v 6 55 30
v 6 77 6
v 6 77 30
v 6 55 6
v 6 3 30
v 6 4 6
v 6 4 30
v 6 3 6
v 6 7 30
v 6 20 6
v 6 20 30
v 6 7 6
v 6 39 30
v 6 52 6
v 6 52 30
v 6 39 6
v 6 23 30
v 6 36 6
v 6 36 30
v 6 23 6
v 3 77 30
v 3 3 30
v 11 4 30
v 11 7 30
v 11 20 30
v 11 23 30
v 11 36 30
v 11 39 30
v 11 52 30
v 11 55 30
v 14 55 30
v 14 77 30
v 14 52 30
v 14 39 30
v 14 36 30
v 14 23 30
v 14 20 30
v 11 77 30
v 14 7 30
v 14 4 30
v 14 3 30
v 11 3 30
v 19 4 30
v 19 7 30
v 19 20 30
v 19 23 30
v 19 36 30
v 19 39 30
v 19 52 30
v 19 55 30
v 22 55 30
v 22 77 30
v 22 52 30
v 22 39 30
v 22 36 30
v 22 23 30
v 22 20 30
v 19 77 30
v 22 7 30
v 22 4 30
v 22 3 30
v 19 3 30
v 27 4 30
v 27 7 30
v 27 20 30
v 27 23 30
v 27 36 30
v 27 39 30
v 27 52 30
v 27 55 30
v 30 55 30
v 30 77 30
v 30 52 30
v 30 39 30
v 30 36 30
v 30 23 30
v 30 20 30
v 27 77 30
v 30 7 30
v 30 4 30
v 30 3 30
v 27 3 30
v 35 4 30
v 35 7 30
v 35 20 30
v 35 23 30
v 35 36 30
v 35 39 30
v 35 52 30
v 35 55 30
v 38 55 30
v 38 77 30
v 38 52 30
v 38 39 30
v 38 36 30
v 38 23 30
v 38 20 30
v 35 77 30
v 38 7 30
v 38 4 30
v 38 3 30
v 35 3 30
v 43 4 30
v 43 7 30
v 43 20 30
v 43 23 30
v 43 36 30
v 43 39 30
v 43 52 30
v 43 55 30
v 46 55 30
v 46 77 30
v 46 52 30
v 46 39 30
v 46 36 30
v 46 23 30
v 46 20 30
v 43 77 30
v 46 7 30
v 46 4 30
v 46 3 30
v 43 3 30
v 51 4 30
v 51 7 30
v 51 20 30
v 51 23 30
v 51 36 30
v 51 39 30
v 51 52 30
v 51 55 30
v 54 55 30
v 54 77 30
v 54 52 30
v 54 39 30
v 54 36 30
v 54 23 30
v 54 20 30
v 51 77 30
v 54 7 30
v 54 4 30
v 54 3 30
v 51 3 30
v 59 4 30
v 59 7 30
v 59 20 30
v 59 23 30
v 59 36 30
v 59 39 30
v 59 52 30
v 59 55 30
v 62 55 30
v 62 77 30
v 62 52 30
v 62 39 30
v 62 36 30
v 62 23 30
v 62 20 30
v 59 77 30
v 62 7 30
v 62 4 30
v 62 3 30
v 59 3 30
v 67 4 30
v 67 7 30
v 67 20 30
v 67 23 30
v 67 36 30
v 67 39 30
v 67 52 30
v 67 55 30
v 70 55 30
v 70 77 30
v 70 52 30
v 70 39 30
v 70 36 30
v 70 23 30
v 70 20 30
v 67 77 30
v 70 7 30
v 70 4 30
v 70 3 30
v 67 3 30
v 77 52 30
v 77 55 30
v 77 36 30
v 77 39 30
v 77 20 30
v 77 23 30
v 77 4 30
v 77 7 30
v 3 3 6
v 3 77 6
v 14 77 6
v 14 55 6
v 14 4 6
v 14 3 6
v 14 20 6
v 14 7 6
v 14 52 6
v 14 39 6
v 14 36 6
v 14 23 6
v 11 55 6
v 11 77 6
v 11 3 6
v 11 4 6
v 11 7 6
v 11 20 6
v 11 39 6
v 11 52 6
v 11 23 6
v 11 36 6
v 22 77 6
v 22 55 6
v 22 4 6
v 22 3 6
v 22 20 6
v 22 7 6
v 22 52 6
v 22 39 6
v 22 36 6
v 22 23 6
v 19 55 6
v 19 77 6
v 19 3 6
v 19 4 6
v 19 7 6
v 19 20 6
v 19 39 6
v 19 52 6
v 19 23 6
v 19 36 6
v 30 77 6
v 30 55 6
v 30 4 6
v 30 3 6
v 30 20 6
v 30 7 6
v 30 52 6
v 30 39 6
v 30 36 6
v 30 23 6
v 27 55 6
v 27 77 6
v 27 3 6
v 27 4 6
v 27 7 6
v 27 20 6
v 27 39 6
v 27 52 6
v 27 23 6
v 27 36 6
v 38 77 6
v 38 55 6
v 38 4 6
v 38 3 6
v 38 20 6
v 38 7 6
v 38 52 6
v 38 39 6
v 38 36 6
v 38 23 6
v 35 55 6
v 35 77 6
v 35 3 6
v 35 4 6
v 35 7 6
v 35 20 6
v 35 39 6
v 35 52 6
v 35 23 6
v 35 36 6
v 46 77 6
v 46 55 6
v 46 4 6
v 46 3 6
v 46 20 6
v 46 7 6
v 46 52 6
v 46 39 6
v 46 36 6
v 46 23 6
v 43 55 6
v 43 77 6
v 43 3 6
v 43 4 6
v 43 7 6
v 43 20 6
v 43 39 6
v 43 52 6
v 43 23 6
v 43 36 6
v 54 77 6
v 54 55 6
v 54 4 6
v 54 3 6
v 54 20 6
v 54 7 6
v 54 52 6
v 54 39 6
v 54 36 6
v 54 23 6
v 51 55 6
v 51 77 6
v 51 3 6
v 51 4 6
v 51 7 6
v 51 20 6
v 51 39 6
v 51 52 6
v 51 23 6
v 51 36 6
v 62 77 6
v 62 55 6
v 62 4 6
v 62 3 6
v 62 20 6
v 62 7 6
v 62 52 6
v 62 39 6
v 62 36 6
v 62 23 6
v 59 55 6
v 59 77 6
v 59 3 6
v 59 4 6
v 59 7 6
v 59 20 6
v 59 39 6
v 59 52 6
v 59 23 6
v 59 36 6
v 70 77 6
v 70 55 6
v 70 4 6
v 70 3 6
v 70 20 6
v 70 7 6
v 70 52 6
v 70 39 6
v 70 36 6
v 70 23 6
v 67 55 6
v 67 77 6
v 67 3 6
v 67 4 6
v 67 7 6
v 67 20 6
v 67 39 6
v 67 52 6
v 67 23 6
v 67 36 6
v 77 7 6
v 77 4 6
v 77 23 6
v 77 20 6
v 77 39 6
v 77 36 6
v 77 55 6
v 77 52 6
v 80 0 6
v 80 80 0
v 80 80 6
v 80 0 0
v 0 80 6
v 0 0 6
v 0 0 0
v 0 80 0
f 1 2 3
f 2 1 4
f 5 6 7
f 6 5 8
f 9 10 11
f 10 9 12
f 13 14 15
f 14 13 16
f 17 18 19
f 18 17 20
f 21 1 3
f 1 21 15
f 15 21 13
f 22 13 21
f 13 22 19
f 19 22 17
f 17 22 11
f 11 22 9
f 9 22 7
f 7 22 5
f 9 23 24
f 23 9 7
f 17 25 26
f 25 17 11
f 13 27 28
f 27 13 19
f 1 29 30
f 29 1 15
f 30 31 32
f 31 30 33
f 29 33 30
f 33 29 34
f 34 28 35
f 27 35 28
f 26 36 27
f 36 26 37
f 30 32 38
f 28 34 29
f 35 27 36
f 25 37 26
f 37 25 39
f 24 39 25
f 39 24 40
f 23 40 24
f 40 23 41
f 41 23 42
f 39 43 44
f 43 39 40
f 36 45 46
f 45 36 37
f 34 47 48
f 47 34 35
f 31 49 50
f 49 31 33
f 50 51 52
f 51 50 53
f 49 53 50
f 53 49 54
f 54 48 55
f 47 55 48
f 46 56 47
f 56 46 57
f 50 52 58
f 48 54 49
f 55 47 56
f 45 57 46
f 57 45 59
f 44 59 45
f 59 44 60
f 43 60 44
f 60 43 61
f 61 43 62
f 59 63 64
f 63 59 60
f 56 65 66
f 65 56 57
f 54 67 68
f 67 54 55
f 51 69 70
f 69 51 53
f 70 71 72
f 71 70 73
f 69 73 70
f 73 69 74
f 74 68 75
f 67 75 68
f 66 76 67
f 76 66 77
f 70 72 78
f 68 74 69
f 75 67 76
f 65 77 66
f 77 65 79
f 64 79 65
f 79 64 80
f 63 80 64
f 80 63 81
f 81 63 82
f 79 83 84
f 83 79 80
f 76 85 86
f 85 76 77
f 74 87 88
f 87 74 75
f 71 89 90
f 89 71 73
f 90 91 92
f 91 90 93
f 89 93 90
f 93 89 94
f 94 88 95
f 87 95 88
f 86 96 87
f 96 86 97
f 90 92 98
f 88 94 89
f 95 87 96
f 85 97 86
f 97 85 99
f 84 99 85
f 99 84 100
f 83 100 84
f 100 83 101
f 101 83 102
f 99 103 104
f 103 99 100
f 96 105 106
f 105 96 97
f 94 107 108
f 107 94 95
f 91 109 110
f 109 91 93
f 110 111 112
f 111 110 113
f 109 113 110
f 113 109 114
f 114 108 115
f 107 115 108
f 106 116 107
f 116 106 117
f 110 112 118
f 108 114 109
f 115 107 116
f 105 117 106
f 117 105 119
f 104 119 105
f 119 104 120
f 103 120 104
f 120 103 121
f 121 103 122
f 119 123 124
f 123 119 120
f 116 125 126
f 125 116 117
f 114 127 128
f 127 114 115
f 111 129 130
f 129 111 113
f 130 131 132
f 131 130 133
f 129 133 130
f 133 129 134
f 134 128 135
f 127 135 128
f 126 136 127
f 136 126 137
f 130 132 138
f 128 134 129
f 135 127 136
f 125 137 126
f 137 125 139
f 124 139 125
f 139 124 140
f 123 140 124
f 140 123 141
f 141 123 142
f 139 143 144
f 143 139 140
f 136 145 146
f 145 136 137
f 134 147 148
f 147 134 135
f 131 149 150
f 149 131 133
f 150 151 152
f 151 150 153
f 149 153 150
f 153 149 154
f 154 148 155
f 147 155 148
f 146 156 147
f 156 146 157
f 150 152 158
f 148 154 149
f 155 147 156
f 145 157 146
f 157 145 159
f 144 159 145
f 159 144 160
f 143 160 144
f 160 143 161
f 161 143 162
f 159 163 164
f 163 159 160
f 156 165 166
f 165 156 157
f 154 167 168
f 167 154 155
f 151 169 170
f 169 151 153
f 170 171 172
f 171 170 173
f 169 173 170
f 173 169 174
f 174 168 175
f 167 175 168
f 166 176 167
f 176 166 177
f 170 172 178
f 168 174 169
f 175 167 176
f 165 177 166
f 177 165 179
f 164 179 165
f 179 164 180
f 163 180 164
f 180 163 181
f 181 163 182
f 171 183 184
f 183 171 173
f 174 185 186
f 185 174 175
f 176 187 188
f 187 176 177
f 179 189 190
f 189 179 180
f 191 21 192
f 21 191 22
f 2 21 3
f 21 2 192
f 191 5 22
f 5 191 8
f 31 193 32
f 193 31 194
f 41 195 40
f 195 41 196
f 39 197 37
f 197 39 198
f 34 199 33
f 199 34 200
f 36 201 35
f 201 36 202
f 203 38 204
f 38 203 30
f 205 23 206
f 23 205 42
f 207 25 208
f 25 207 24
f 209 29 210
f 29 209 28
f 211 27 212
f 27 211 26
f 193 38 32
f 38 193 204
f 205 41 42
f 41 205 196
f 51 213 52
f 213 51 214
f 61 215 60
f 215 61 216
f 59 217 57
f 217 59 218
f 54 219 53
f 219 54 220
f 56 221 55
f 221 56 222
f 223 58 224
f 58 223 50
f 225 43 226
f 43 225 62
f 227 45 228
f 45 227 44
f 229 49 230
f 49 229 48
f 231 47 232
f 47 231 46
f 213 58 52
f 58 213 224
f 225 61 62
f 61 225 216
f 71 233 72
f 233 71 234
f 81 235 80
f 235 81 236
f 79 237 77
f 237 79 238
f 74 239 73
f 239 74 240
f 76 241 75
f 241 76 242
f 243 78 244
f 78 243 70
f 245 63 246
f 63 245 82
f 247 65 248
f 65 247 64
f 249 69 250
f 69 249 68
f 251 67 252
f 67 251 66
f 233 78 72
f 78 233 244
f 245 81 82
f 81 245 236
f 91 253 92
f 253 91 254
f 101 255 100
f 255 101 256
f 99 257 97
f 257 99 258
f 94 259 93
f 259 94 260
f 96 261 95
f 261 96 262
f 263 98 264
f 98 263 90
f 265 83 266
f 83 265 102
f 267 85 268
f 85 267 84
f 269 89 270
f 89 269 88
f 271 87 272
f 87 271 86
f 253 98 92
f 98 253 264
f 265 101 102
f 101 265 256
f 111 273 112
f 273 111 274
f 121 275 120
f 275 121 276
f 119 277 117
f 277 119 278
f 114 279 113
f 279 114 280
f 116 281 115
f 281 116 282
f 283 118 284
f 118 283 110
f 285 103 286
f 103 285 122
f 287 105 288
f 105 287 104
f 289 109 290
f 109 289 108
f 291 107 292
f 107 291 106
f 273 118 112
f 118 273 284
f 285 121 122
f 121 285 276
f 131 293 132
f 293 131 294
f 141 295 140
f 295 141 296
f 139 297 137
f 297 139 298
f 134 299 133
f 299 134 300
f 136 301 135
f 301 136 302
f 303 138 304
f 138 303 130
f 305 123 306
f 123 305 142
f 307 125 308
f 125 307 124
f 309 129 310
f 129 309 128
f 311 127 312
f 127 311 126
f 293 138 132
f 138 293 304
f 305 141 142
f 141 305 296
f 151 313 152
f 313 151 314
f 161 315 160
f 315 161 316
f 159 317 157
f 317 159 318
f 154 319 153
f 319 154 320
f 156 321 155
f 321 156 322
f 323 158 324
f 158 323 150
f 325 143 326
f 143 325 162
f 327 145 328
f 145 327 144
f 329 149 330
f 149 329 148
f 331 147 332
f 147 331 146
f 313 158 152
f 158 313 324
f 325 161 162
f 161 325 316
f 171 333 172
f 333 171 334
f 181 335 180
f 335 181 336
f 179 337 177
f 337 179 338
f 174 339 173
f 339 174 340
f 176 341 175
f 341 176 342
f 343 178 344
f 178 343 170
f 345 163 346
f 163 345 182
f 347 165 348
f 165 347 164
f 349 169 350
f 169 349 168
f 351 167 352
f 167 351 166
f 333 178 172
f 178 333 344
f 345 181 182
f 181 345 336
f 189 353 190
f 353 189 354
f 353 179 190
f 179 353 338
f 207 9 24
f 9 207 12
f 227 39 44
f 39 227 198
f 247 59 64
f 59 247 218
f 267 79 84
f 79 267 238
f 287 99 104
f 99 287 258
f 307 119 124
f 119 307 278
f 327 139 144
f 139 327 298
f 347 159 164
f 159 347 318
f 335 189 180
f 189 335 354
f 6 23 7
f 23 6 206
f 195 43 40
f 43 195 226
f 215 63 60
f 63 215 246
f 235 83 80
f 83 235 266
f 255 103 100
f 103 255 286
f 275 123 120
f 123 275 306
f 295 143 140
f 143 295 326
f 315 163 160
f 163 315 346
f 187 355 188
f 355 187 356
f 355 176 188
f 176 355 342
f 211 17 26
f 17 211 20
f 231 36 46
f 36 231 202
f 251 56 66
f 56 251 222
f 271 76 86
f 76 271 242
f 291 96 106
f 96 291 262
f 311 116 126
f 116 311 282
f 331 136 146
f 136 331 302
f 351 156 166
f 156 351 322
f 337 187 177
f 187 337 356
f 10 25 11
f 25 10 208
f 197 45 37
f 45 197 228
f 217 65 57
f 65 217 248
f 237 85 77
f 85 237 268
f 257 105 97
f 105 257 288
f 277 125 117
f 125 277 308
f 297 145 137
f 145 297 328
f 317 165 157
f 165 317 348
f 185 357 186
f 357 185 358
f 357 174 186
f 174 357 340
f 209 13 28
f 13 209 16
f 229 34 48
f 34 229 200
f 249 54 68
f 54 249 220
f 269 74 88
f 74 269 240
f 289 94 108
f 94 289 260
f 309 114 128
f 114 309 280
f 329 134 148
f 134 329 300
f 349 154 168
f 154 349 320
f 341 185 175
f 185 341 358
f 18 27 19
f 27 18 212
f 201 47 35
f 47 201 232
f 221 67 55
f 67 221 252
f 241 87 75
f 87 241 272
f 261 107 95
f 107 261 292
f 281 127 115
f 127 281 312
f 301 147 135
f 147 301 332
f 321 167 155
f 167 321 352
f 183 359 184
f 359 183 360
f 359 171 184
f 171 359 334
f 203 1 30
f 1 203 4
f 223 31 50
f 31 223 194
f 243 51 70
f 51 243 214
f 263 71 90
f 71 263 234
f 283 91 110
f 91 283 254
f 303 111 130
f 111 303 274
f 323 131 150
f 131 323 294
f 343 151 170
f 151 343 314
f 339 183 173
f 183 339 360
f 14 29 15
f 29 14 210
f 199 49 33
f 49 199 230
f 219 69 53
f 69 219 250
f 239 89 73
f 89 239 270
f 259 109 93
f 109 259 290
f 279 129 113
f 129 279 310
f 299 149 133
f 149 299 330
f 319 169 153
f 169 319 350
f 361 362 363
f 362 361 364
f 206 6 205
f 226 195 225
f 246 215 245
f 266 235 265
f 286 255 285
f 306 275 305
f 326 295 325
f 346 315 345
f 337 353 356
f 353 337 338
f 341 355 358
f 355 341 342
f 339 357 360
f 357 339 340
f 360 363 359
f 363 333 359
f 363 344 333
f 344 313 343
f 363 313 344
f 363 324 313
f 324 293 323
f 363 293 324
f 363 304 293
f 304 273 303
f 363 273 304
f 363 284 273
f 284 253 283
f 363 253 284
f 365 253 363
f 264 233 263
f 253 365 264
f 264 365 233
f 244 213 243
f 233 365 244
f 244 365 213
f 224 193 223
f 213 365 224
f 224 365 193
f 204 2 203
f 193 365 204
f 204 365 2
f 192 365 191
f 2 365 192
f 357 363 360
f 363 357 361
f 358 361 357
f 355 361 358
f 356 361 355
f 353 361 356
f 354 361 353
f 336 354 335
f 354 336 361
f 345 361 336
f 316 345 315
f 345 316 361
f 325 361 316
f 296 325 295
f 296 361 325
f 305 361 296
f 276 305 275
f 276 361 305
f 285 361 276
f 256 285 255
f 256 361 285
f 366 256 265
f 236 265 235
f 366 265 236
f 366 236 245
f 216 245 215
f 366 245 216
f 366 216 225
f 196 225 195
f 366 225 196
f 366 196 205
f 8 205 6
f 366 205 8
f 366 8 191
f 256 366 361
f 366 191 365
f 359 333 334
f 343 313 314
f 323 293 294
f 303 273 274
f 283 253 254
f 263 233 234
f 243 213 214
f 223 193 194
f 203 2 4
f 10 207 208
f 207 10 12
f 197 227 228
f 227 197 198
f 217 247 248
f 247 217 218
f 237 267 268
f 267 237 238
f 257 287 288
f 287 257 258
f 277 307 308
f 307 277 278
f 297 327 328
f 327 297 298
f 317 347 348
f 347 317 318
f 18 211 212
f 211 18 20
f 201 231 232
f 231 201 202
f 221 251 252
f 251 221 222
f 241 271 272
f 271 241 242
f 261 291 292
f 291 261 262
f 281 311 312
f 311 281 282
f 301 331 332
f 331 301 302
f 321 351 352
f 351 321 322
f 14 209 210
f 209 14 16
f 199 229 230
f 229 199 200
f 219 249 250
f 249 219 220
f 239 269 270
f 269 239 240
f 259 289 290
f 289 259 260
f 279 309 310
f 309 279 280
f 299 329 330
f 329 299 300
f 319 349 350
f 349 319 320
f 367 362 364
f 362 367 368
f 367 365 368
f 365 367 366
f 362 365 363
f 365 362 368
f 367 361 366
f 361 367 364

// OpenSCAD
$fn = 32;

// ----------------------------------------------------------------------
// Heatsink: cross fin block
// ----------------------------------------------------------------------

// --- parameters (mm) ---
base_l = 80;              // base length, X
base_w = 80;              // base width, Y
base_t = 6;               // base plate thickness
fin_h = 25;               // fin height above the base
fin_t = 3;                // fin thickness
edge = 3;                 // margin from the base ends
pitch = 8;                // fin pitch
rib_pitch = 16;           // cross rib pitch

n_fins = floor((base_l - 2 * edge - fin_t) / pitch) + 1;  // fin count
total_h = base_t + fin_h - 1;  // overall height
n_ribs = floor((base_w - 2 * edge) / rib_pitch);  // rib count

union() {
  cube([base_l, base_w, base_t]);
  for (i = [0 : n_fins - 1])
    translate([edge + i * pitch, edge, base_t - 1])
      cube([fin_t, base_w - 2 * edge, fin_h]);
  for (i = [0 : n_ribs - 1])
    translate([edge, edge + 1 + i * rib_pitch, base_t - 1])
      cube([base_l - 2 * edge, fin_t, fin_h]);
}
